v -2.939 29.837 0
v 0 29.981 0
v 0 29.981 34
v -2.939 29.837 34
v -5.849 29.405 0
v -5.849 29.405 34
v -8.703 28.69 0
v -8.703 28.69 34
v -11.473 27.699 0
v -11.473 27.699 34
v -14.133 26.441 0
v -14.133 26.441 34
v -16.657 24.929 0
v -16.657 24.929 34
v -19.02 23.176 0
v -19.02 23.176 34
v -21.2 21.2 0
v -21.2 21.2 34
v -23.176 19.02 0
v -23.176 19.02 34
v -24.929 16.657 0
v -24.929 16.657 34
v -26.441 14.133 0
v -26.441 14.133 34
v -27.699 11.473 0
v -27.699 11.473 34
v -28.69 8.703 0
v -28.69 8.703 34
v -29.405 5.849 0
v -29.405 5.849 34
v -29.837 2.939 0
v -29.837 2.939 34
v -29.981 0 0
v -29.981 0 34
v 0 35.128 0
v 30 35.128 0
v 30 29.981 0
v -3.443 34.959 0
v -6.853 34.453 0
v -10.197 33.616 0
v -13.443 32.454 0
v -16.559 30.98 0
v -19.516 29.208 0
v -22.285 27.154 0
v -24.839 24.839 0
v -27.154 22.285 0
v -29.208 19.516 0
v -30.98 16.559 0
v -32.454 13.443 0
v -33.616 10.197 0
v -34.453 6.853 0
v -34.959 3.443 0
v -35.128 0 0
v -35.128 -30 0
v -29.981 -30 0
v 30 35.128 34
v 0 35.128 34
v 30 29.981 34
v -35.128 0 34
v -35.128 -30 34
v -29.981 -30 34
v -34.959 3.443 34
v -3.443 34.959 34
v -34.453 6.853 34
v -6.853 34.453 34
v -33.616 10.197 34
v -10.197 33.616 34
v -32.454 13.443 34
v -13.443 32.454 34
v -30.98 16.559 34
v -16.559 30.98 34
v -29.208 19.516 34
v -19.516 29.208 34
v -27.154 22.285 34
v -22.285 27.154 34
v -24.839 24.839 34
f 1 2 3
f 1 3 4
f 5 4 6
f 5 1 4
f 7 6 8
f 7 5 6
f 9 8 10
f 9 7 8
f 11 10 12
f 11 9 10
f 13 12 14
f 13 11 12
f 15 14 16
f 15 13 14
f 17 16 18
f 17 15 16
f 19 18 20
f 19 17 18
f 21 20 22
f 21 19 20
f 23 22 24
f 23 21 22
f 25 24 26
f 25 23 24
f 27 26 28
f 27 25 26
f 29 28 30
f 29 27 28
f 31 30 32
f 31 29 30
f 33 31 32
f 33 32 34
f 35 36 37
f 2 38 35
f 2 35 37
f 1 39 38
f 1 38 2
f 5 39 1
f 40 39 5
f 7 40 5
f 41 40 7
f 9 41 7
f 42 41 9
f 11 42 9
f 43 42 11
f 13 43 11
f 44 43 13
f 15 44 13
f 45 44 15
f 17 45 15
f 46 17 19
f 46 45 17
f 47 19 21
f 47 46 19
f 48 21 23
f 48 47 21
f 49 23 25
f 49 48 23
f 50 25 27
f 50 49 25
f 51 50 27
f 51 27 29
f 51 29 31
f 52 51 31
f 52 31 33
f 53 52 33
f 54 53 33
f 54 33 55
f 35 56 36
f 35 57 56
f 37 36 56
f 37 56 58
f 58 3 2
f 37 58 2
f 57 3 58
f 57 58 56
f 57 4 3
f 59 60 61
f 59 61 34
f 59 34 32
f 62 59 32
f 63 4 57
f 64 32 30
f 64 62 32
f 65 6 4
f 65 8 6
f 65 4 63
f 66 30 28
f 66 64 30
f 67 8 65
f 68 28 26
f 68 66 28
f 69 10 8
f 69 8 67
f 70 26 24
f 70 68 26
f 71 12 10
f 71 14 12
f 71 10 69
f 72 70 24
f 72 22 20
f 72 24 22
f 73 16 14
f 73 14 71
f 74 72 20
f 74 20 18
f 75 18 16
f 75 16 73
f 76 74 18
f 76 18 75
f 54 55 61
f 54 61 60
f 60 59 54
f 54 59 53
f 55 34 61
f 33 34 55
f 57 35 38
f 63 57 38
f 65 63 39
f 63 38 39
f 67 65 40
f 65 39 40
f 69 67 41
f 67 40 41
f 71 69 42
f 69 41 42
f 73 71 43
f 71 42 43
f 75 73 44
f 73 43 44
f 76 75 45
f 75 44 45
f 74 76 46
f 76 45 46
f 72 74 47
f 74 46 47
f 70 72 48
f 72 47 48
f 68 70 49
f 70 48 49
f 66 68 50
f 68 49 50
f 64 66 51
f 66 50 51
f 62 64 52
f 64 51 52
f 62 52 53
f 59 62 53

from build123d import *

# Parameters (mm, degrees)
F0_R     = 35.128120954
F0_R_2   = 29.9814765583
F1_DEPTH = 34
F3_DEPTH = 56.7
F4_DEPTH = 15
F5_DEPTH = 15
F6_DEPTH = 15
F7_DEPTH = 15


# Not quite as in the source:
# - a feature names something its author has since deleted; it is built from what else it names


with BuildPart() as f1:
    # F0 (on Top) → F1 (new body)
    with BuildSketch(Plane.XY):
        Circle(F0_R)
        Circle(F0_R_2, mode=Mode.SUBTRACT)
    extrude(amount=F1_DEPTH)

    # F2 (on Top) → F3 (cut)
    with BuildSketch(Plane.XY):
        Polygon((0, 50.666205585), (0, 0), (-44.6641780436, 0), (-44.6641780436, -44.4084256887), (0, -44.4084256887), (0, -49.6323108673), (44.1417917609, -49.6323108673), (44.1417917609, 0), (47.7985069156, 0), (47.7985069156, 50.666205585), align=None)
    extrude(amount=F3_DEPTH, mode=Mode.SUBTRACT)

    # F4 (add): a face of the model
    f4_faces = [f1.faces().sort_by_distance(p)[0] for p in [
        (0, 32.5547987561, 17),
    ]]
    extrude(f4_faces, amount=F4_DEPTH)

    # F5 (add): a face of the model
    f5_faces = [f1.faces().sort_by_distance(p)[0] for p in [
        (-32.5547987561, 0, 17),
    ]]
    extrude(f5_faces, amount=F5_DEPTH)

    # F6 (add): a face of the model
    f6_faces = [f1.faces().sort_by_distance(p)[0] for p in [
        (-32.5547987561, -15, 17),
    ]]
    extrude(f6_faces, amount=F6_DEPTH)

    # F7 (add): a face of the model
    f7_faces = [f1.faces().sort_by_distance(p)[0] for p in [
        (15, 32.5547987561, 17),
    ]]
    extrude(f7_faces, amount=F7_DEPTH)


solid = f1.part
